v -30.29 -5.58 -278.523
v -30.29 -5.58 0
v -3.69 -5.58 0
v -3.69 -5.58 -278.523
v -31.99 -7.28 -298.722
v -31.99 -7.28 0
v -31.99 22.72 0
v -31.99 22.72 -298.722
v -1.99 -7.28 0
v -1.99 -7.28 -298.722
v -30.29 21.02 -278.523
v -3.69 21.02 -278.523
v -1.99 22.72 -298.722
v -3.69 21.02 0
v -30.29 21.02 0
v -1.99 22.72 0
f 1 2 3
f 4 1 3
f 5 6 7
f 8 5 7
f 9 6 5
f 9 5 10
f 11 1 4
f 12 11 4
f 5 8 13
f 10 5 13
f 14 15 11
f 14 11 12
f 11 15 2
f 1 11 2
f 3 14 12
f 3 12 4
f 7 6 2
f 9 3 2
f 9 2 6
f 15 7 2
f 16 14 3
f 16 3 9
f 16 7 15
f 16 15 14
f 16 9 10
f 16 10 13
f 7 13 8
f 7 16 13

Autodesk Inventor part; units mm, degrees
ref_plane "YZ Plane" through (0, 0, 0) normal (1, 0, 0) x (0, 1, 0)
ref_plane "XZ Plane" through (0, 0, 0) normal (0, 1, 0) x (-1, 0, 0)
ref_plane "XY Plane" through (0, 0, 0) normal (0, 0, 1) x (1, 0, 0)
sketch "Sketch1" plane through (0, 0, 0) normal (0, 0, 1) x (1, 0, 0)
  line L0 (-31.9903, -7.2804) -> (-1.9903, -7.2804)
  line L1 (-1.9903, -7.2804) -> (-1.9903, 22.7196)
  line L2 (-1.9903, 22.7196) -> (-31.9903, 22.7196)
  line L3 (-31.9903, -7.2804) -> (-31.9903, 22.7196)
  line L4 (-30.2903, 22.7196) -> (-30.2903, -7.2804)
  line L5 (-31.9903, -5.5804) -> (-1.9903, -5.5804)
  line L6 (-3.6903, 22.7196) -> (-3.6903, -7.2804)
  line L7 (-31.9903, 21.0196) -> (-1.9903, 21.0196)
  point P0 (0, 0)
  point P1 (-3.6903, 21.0196)
  point P2 (-30.2903, 21.0196)
  point P3 (-30.2903, -5.5804)
  point P4 (-3.6903, -5.5804)
  dimension "d0" = 30
  dimension "d1" = 30
  dimension "d2" = 1.7
  dimension "d3" = 1.7
  dimension "d4" = 1.7
  dimension "d5" = 1.7
extrude "Extrusion1" add sketch "Sketch1" against normal blind 298.722
extrude "Extrusion2" cut sketch "Sketch1" against normal blind 278.523 contours L4 L7 L6 L5
properties part number "Cablecanal Ranurado 30x30 L=115 mm" material "PVC-Piping"
